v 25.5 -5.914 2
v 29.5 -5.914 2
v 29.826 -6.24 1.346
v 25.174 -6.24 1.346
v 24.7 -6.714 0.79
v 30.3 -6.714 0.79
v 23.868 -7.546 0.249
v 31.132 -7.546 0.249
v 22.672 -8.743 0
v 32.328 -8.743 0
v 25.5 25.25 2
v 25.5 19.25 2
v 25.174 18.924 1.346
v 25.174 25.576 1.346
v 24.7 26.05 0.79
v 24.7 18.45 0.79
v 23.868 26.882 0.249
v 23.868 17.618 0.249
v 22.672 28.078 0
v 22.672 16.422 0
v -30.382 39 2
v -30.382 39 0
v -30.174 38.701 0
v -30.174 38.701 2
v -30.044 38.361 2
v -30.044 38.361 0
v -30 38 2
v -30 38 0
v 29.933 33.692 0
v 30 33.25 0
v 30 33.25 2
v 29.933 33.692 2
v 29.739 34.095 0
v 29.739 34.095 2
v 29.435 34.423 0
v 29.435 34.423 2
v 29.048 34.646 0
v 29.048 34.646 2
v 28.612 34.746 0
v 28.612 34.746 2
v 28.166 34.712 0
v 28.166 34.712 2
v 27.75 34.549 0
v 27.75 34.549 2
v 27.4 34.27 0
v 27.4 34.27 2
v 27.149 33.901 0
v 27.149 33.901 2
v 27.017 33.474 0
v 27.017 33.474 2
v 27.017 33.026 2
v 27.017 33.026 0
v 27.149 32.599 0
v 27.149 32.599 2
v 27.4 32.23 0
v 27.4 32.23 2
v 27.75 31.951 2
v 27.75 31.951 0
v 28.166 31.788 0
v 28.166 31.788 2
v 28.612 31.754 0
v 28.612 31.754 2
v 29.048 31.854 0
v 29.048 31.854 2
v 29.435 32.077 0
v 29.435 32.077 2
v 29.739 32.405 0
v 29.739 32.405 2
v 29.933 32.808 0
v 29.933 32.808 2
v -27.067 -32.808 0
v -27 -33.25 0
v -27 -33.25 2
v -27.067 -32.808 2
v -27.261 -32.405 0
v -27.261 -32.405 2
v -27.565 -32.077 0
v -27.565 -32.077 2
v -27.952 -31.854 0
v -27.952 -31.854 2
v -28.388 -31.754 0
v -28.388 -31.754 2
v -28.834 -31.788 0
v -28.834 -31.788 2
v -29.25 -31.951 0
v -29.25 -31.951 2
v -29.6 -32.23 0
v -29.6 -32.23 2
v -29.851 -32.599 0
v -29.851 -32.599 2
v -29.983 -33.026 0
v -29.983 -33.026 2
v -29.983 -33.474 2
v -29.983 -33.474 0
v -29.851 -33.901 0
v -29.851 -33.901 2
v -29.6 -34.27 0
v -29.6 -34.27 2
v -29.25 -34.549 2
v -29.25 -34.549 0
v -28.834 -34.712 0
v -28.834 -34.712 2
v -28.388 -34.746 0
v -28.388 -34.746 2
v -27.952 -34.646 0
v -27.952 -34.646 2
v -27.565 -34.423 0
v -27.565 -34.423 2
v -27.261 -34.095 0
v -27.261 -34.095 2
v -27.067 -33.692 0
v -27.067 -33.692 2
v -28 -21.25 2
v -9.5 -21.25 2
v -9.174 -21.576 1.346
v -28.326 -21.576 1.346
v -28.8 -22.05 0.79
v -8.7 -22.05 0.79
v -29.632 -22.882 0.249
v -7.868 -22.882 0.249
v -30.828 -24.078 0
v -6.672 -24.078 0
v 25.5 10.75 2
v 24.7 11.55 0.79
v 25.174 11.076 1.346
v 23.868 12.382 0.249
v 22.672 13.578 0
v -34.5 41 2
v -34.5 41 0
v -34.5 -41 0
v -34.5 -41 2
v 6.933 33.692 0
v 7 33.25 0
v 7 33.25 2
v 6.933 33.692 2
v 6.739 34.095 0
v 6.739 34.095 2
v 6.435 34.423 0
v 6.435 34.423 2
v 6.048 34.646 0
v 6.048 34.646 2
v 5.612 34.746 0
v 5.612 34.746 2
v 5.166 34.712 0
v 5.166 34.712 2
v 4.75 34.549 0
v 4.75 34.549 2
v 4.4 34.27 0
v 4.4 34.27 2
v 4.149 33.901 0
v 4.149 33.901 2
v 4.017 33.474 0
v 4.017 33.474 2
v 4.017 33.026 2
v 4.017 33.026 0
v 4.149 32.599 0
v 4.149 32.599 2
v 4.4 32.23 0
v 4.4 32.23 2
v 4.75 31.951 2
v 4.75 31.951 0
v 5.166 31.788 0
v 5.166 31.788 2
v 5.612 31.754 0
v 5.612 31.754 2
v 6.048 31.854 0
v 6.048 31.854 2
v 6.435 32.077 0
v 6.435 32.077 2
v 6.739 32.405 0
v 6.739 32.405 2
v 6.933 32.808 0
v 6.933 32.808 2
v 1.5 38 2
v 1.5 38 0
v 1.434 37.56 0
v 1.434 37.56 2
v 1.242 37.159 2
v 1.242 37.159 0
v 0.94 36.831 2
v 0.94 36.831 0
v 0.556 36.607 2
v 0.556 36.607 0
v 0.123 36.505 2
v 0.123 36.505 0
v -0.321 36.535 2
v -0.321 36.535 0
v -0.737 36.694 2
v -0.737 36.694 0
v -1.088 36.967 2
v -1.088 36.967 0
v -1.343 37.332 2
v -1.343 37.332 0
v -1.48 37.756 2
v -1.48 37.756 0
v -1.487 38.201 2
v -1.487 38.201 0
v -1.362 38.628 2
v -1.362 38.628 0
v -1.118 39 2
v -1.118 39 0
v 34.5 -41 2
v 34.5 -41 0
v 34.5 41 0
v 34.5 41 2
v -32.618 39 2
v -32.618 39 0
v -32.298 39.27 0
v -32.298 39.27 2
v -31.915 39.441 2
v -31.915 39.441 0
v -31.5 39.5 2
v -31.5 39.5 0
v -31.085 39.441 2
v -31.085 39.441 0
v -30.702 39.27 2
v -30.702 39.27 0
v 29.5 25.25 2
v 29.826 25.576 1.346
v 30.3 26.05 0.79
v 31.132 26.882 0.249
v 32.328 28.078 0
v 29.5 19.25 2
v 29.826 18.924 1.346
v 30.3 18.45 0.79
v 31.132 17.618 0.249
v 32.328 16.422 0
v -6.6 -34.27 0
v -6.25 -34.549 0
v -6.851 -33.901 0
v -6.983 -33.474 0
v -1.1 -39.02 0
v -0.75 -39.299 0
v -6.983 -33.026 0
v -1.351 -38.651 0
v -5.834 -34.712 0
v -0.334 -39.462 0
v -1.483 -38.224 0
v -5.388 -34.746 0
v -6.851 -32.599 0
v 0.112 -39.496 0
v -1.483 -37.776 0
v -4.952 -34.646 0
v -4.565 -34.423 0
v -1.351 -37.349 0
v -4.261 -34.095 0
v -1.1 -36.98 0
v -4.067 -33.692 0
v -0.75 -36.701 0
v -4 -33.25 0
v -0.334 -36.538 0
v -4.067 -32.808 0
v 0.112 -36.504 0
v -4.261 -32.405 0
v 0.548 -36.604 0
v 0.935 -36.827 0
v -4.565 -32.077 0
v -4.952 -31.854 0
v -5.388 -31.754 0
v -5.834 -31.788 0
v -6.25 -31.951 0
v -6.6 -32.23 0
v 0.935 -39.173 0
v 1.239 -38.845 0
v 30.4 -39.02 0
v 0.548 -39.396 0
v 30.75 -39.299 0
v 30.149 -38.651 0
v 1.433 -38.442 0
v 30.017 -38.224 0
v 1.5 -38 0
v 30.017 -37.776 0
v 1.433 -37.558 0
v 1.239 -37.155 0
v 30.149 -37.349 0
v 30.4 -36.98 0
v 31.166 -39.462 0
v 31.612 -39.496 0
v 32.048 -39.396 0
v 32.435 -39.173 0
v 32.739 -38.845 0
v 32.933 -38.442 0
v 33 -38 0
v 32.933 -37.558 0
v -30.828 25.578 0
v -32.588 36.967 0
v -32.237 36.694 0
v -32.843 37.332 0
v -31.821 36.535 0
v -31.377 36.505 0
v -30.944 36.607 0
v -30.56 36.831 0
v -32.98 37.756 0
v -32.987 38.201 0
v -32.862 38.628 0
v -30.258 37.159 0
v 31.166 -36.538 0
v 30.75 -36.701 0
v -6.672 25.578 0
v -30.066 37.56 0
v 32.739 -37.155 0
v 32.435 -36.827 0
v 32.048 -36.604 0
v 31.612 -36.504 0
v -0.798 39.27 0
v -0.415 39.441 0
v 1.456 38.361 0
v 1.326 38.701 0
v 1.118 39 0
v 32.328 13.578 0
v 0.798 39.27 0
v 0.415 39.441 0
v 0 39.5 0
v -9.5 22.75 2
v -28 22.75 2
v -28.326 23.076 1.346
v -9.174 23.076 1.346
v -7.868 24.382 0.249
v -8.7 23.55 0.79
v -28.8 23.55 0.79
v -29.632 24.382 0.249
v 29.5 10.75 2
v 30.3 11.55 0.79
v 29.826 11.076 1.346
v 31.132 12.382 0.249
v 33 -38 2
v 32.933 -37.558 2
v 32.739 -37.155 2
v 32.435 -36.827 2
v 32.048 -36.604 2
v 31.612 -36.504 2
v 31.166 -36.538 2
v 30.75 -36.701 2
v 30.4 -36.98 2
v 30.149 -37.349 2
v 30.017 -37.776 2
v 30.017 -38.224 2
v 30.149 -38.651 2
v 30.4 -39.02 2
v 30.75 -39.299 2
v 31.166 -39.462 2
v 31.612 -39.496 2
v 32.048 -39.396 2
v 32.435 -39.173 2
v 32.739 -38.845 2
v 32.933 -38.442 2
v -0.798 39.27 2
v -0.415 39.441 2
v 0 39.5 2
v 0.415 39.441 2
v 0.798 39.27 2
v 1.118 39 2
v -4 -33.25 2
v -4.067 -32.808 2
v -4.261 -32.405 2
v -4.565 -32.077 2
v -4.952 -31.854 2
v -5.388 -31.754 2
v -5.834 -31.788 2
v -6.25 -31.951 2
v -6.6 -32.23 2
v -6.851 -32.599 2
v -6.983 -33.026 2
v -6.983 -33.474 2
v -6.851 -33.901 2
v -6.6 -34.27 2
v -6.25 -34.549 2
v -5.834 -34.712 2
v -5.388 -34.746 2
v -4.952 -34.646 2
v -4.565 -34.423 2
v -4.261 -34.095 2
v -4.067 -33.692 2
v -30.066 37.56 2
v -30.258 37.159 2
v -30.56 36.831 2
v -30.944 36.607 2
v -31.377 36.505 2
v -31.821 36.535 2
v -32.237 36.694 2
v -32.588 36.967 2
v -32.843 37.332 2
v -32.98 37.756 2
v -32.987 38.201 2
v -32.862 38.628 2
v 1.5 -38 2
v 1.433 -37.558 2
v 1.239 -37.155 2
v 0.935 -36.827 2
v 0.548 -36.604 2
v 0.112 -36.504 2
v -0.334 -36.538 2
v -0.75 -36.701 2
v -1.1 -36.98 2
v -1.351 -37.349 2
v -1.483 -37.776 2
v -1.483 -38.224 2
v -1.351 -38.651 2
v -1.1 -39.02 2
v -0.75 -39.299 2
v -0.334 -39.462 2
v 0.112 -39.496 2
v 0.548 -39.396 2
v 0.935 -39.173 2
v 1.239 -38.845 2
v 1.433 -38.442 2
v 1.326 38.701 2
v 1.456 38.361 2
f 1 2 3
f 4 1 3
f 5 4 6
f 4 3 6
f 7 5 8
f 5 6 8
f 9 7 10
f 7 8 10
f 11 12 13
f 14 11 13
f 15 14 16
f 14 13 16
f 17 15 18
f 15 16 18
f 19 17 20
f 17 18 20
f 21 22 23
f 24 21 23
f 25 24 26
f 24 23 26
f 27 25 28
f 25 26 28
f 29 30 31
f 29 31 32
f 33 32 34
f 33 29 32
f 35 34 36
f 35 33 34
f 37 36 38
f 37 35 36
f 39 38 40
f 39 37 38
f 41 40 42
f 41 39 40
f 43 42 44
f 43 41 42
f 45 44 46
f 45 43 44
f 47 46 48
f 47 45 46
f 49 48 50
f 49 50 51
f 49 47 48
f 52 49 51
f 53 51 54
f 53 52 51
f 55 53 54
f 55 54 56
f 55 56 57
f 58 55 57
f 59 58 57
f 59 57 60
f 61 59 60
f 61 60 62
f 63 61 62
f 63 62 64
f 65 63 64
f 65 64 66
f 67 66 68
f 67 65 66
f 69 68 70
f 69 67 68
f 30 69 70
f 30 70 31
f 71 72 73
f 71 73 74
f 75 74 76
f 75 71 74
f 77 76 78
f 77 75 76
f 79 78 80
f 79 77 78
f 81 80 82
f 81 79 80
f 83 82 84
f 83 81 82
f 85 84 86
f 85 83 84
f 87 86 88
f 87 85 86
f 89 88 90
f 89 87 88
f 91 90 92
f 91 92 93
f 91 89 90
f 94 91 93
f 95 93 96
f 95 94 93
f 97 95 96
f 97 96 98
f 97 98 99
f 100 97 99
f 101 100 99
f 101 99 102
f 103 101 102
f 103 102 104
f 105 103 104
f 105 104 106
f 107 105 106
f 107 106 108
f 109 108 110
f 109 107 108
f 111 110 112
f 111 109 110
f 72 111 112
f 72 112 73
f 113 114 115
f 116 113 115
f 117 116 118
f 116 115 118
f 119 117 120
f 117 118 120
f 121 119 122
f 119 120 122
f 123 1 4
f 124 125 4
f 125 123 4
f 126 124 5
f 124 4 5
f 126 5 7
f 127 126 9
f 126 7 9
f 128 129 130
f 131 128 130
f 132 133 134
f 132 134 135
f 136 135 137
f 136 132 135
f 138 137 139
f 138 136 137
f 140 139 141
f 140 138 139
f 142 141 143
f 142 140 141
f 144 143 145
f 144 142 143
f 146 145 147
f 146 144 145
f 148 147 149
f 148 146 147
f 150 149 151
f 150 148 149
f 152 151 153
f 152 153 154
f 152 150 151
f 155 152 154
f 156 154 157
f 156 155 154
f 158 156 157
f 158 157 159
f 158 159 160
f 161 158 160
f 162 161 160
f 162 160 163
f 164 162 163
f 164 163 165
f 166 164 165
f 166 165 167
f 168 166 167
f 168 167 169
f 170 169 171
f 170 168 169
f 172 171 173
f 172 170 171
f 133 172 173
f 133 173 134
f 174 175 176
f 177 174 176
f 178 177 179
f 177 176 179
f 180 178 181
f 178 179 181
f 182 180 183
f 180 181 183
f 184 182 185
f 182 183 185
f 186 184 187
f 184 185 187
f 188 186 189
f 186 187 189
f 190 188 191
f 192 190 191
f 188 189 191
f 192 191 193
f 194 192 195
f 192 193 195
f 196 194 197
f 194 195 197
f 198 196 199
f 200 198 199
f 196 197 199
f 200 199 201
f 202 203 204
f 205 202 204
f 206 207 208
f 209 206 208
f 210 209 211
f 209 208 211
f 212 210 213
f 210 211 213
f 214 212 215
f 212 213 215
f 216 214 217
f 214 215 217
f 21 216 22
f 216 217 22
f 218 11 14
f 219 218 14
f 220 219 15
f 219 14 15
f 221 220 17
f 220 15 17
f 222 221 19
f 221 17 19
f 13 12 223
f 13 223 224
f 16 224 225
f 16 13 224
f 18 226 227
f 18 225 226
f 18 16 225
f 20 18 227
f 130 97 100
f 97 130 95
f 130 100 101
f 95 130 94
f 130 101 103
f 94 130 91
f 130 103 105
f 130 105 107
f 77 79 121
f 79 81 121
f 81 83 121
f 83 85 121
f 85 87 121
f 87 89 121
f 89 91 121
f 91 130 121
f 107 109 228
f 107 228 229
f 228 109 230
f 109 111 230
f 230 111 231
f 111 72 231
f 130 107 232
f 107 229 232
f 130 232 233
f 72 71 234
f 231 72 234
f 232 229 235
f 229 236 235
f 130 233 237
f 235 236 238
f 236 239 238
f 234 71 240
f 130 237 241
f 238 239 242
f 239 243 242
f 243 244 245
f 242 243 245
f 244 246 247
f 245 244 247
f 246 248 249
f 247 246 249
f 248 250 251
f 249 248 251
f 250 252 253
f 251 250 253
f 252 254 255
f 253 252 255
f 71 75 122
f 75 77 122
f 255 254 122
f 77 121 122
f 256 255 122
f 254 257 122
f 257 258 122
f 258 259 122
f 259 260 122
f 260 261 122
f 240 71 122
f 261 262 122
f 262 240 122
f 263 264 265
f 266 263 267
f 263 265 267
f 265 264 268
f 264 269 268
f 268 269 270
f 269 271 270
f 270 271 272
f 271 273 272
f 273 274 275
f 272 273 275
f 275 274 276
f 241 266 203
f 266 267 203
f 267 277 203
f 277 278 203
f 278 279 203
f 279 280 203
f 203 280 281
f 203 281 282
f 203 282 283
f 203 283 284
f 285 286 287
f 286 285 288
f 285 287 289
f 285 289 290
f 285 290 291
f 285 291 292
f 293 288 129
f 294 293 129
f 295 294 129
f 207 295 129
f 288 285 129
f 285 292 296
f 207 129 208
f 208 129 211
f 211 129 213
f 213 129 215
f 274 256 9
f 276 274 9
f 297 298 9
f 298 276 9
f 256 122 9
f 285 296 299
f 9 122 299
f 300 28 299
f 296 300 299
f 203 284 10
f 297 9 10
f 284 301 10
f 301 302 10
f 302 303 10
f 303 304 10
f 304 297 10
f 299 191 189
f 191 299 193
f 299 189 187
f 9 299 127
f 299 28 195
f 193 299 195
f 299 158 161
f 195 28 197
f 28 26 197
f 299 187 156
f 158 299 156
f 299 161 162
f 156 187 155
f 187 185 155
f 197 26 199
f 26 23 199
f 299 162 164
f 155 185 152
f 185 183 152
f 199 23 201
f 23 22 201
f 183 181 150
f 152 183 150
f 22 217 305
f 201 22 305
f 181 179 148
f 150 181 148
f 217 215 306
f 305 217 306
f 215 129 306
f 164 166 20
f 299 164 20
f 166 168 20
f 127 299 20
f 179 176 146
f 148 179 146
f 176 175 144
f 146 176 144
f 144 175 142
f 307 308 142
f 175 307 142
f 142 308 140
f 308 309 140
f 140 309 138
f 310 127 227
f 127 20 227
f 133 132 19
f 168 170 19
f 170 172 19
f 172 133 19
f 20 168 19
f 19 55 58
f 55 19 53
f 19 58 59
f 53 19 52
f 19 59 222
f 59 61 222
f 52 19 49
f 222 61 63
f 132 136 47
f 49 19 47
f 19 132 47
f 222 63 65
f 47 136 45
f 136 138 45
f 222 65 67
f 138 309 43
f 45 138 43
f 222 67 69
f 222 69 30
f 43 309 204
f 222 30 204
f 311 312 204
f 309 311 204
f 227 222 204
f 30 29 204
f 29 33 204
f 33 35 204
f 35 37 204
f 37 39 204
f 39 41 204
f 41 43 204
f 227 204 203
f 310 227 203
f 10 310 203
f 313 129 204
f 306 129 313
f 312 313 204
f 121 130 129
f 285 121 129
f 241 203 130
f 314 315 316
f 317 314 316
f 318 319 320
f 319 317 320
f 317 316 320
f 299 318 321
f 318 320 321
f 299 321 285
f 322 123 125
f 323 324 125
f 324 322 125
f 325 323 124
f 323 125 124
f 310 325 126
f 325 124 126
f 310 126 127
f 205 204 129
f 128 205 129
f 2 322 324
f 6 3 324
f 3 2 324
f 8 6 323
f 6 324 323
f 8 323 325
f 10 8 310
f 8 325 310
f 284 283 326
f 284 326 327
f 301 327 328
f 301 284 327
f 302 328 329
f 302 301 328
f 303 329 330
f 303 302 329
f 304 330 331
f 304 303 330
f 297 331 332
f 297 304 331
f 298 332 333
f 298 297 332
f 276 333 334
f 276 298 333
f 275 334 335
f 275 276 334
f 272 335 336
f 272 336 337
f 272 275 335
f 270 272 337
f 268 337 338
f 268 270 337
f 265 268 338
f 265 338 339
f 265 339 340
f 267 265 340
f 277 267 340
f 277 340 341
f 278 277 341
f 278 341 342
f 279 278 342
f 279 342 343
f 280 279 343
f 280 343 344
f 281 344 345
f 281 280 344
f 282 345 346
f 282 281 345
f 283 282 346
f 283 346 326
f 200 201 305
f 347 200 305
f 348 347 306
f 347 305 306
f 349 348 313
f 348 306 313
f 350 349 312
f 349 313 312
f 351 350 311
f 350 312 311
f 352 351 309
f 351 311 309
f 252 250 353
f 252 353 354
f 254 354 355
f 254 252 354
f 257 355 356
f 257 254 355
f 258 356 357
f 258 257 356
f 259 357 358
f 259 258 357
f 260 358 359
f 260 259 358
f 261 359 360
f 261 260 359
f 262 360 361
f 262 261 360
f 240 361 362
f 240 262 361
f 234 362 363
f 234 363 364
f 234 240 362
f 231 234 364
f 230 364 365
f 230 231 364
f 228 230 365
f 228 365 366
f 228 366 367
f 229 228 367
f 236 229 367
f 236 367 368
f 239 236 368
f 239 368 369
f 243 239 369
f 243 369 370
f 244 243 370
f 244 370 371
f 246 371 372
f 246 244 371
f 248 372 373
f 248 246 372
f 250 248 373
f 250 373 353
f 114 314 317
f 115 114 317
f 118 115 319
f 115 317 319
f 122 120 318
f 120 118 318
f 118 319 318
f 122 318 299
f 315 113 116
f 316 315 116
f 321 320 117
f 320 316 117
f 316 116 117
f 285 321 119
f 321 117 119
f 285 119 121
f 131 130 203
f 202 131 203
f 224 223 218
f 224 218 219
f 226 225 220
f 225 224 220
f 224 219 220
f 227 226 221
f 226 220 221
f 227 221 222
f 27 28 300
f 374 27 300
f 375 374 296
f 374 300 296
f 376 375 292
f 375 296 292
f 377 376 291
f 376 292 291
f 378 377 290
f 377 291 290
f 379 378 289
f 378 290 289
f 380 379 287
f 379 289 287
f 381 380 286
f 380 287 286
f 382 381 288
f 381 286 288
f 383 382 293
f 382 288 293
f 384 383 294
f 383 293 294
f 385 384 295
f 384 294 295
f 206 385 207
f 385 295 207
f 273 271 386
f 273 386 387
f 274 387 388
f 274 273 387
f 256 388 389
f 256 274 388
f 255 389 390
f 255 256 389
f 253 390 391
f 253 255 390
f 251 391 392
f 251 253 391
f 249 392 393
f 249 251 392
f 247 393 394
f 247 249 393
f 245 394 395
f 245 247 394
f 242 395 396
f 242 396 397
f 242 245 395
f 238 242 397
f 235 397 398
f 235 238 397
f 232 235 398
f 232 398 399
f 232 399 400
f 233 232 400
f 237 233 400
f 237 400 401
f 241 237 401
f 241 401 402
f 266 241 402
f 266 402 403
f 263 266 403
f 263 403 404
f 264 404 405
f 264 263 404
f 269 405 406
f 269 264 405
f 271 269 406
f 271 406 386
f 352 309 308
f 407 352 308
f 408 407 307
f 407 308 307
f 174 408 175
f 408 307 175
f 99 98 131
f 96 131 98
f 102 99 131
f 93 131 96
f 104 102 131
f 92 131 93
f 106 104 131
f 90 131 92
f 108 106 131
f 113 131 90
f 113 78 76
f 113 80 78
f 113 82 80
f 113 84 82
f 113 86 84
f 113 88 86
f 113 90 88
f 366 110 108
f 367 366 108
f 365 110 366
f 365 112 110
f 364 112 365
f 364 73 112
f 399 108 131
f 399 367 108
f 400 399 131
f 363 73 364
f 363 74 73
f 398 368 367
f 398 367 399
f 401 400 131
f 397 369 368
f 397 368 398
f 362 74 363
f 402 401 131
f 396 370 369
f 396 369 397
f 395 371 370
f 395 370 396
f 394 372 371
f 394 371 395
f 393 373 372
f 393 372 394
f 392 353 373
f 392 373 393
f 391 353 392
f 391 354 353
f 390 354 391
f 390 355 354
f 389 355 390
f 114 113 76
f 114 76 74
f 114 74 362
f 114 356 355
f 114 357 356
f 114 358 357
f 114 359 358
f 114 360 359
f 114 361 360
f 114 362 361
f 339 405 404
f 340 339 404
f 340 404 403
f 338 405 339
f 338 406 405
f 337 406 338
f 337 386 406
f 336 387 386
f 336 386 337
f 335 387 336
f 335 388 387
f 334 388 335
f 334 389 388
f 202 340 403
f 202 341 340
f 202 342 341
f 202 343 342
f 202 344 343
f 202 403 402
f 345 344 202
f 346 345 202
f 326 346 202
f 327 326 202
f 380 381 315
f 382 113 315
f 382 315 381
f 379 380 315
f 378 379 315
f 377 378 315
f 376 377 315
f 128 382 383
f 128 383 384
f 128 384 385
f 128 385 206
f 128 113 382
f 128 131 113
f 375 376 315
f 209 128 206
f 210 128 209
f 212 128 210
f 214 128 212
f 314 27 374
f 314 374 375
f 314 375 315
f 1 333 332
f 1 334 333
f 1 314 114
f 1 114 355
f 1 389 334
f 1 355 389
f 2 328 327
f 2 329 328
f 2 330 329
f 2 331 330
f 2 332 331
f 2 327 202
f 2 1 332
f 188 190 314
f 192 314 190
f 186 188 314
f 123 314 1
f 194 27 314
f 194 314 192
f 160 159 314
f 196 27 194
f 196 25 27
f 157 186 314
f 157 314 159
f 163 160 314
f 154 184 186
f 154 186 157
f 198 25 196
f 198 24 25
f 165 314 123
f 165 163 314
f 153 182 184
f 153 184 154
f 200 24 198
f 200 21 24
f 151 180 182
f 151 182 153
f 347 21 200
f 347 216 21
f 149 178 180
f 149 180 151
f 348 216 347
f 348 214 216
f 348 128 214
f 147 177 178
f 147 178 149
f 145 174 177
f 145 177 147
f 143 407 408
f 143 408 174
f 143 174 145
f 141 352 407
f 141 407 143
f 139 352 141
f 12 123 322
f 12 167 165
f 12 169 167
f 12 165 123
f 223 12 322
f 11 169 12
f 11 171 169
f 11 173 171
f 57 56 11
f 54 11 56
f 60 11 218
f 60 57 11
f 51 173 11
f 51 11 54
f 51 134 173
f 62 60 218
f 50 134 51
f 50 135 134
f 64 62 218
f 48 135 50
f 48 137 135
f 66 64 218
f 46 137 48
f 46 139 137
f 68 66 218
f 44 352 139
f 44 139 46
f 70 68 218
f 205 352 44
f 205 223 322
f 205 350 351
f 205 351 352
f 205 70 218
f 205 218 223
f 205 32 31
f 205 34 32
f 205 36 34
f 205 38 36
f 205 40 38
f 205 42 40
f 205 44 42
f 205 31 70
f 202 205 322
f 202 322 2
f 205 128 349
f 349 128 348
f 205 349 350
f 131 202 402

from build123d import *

# Parameters (mm, degrees)
F0_R          = 1.5
F0_W          = 18.5
F0_H          = 44
F0_W_2        = 4
F0_H_2        = 16.6644380502
F0_H_3        = 6
F0_W_3        = 4.7
F0_H_4        = 2
F0_W_4        = 13
F0_W_5        = 2.3
F0_W_6        = 1.5
F0_W_7        = 9
F0_W_8        = 11
F1_DEPTH      = 2
F2_T1_DEPTH   = 16.6644380502
F2_T3_DEPTH   = 4
F2_T5_DEPTH   = 6
F2_T7_DEPTH   = 44
F2_T9_DEPTH   = 18.5
F2_T15_DEPTH  = 11.0710678119
F2_T19_DEPTH  = 23.7355058621
F2_T26_DEPTH  = 11.0710678119
F2_T30_DEPTH  = 23.7355058621
F2_T37_DEPTH  = 23.7355058621
F2_T41_DEPTH  = 11.0710678119
F2_T49_DEPTH  = 11.0710678119
F2_T54_DEPTH  = 23.7355058621
F2_T61_DEPTH  = 13.0710678119
F2_T65_DEPTH  = 11.0710678119
F2_T73_DEPTH  = 13.0710678119
F2_T77_DEPTH  = 11.0710678119
F2_T84_DEPTH  = 11.0710678119
F2_T89_DEPTH  = 13.0710678119
F2_S91_R      = 1.5
F2_T92_DEPTH  = 8
F2_T98_DEPTH  = 13.0710678119
F2_T102_DEPTH = 11.0710678119
F2_T109_DEPTH = 25.5710678119
F2_T113_DEPTH = 51.0710678119
F2_T120_DEPTH = 51.0710678119
F2_T124_DEPTH = 25.5710678119
F2_T131_DEPTH = 51.0710678119
F2_T135_DEPTH = 25.5710678119
F2_T143_DEPTH = 51.0710678119
F2_T147_DEPTH = 25.5710678119


# Not quite as in the source:
# - a fillet or chamfer that OpenCascade refuses, or shapes differently, is made with other operations: its cross-section is extruded or revolved along the edge and cut away or added


with BuildPart() as f1:
    # F0 (on Top) → F1 (new body)
    with BuildSketch(Plane.XY):
        with BuildLine():
            Line((12.5, -41), (34.5, -41))
            Line((34.5, -41), (34.5, 39))
            Line((34.5, 39), (28.5, 39))
            Line((28.5, 39), (25.5, 39))
            Line((25.5, 39), (20.8, 39))
            Line((20.8, 39), (7.8, 39))
            Line((7.8, 39), (5.5, 39))
            Line((5.5, 39), (1.1180339887, 39))
            ThreePointArc((1.1180339887, 39), (1.4012585384, 38.5352331347), (1.5, 38))
            ThreePointArc((1.5, 38), (-0.5352331347, 36.5987414616), (-1.1180339887, 39))
            Line((-1.1180339887, 39), (-5.5, 39))
            Line((-5.5, 39), (-14.5, 39))
            Line((-14.5, 39), (-25.5, 39))
            Line((-25.5, 39), (-27, 39))
            Line((-27, 39), (-28.5, 39))
            Line((-28.5, 39), (-30.3819660113, 39))
            ThreePointArc((-30.3819660113, 39), (-30.0987414616, 38.5352331347), (-30, 38))
            ThreePointArc((-30, 38), (-32.0352331347, 36.5987414616), (-32.6180339887, 39))
            Line((-32.6180339887, 39), (-34.5, 39))
            Line((-34.5, 39), (-34.5, -41))
            Line((-34.5, -41), (-12.5, -41))
            Line((-12.5, -41), (-10.5, -41))
            Line((-10.5, -41), (10.5, -41))
            Line((10.5, -41), (12.5, -41))
        make_face()
        with Locations((-28.5, -33.25)):
            Circle(F0_R, mode=Mode.SUBTRACT)
        with Locations((-5.5, -33.25)):
            Circle(F0_R, mode=Mode.SUBTRACT)
        with Locations((0, -38)):
            Circle(F0_R, mode=Mode.SUBTRACT)
        with Locations((31.5, -38)):
            Circle(F0_R, mode=Mode.SUBTRACT)
        with Locations((-18.75, 0.75)):
            Rectangle(F0_W, F0_H, mode=Mode.SUBTRACT)
        with Locations((-28.5, 33.25)):
            Circle(F0_R, mode=Mode.SUBTRACT)
        with Locations((-5.5, 33.25)):
            Circle(F0_R, mode=Mode.SUBTRACT)
        with Locations((27.5, 2.4177809749)):
            Rectangle(F0_W_2, F0_H_2, mode=Mode.SUBTRACT)
        with Locations((5.5, 33.25)):
            Circle(F0_R, mode=Mode.SUBTRACT)
        with Locations((27.5, 22.25)):
            Rectangle(F0_W_2, F0_H_3, mode=Mode.SUBTRACT)
        with Locations((28.5, 33.25)):
            Circle(F0_R, mode=Mode.SUBTRACT)
        Polygon((28.5, 39), (34.5, 39), (34.5, 41), (28, 41), (25.5, 41), (25.5, 39), align=None)
        with Locations((23.15, 40)):
            Rectangle(F0_W_3, F0_H_4)
        with Locations((14.3, 40)):
            Rectangle(F0_W_4, F0_H_4)
        with Locations((6.65, 40)):
            Rectangle(F0_W_5, F0_H_4)
        with BuildLine():
            Line((-34.5, 41), (-34.5, 39))
            Line((-34.5, 39), (-32.6180339887, 39))
            ThreePointArc((-32.6180339887, 39), (-31.5, 39.5), (-30.3819660113, 39))
            Line((-30.3819660113, 39), (-28.5, 39))
            Line((-28.5, 39), (-27, 39))
            Line((-27, 39), (-27, 41))
            Line((-27, 41), (-34.5, 41))
        make_face()
        with BuildLine():
            Line((1.1180339887, 39), (5.5, 39))
            Line((5.5, 39), (5.5, 41))
            Line((5.5, 41), (-5.5, 41))
            Line((-5.5, 41), (-5.5, 39))
            Line((-5.5, 39), (-1.1180339887, 39))
            ThreePointArc((-1.1180339887, 39), (0, 39.5), (1.1180339887, 39))
        make_face()
        with Locations((-26.25, 40)):
            Rectangle(F0_W_6, F0_H_4)
        with Locations((-10, 40)):
            Rectangle(F0_W_7, F0_H_4)
        with Locations((-20, 40)):
            Rectangle(F0_W_8, F0_H_4)
        with Locations((-28.5, 33.25)):
            Circle(F0_R)
        with Locations((-5.5, 33.25)):
            Circle(F0_R)
    extrude(amount=F1_DEPTH)

    # F2: fillet of radius 3 on 12 edges, made by hand

    # F2_s2 → F2_t1 (cut)
    with BuildSketch(Plane.XZ.offset(-10.75)):
        with BuildLine():
            ThreePointArc((25.5, 2), (24.4036236828, 0.5505102572), (22.6715728753, 0))
            Line((22.6715728753, 0), (25.5, 0))
            Line((25.5, 0), (25.5, 2))
        make_face()
        with BuildLine():
            ThreePointArc((29.5, 2), (30.5963763172, 0.5505102572), (32.3284271247, 0))
            Line((32.3284271247, 0), (29.5, 0))
            Line((29.5, 0), (29.5, 2))
        make_face()
    extrude(amount=F2_T1_DEPTH, mode=Mode.SUBTRACT)

    # F2_s4 → F2_t3 (cut)
    with BuildSketch(Plane.YZ.offset(25.5)):
        with BuildLine():
            ThreePointArc((-5.9144380502, 2), (-7.0108143674, 0.5505102572), (-8.742865175, 0))
            Line((-8.742865175, 0), (-5.9144380502, 0))
            Line((-5.9144380502, 0), (-5.9144380502, 2))
        make_face()
        with BuildLine():
            ThreePointArc((10.75, 2), (11.8463763172, 0.5505102572), (13.5784271247, 0))
            Line((13.5784271247, 0), (10.75, 0))
            Line((10.75, 0), (10.75, 2))
        make_face()
        with BuildLine():
            ThreePointArc((19.25, 2), (18.1536236828, 0.5505102572), (16.4215728753, 0))
            Line((16.4215728753, 0), (19.25, 0))
            Line((19.25, 0), (19.25, 2))
        make_face()
        with BuildLine():
            ThreePointArc((25.25, 2), (26.3463763172, 0.5505102572), (28.0784271247, 0))
            Line((28.0784271247, 0), (25.25, 0))
            Line((25.25, 0), (25.25, 2))
        make_face()
    extrude(amount=F2_T3_DEPTH, mode=Mode.SUBTRACT)

    # F2_s6 → F2_t5 (cut)
    with BuildSketch(Plane.XZ.offset(-25.25)):
        with BuildLine():
            ThreePointArc((29.5, 2), (30.5963763172, 0.5505102572), (32.3284271247, 0))
            Line((32.3284271247, 0), (29.5, 0))
            Line((29.5, 0), (29.5, 2))
        make_face()
        with BuildLine():
            ThreePointArc((25.5, 2), (24.4036236828, 0.5505102572), (22.6715728753, 0))
            Line((22.6715728753, 0), (25.5, 0))
            Line((25.5, 0), (25.5, 2))
        make_face()
    extrude(amount=F2_T5_DEPTH, mode=Mode.SUBTRACT)

    # F2_s8 → F2_t7 (cut)
    with BuildSketch(Plane.XZ.offset(-22.75)):
        with BuildLine():
            ThreePointArc((-9.5, 2), (-8.4036236828, 0.5505102572), (-6.6715728753, 0))
            Line((-6.6715728753, 0), (-9.5, 0))
            Line((-9.5, 0), (-9.5, 2))
        make_face()
        with BuildLine():
            ThreePointArc((-28, 2), (-29.0963763172, 0.5505102572), (-30.8284271247, 0))
            Line((-30.8284271247, 0), (-28, 0))
            Line((-28, 0), (-28, 2))
        make_face()
    extrude(amount=F2_T7_DEPTH, mode=Mode.SUBTRACT)

    # F2_s10 → F2_t9 (cut)
    with BuildSketch(Plane.YZ.offset(-28)):
        with BuildLine():
            ThreePointArc((-21.25, 2), (-22.3463763172, 0.5505102572), (-24.0784271247, 0))
            Line((-24.0784271247, 0), (-21.25, 0))
            Line((-21.25, 0), (-21.25, 2))
        make_face()
        with BuildLine():
            ThreePointArc((22.75, 2), (23.8463763172, 0.5505102572), (25.5784271247, 0))
            Line((25.5784271247, 0), (22.75, 0))
            Line((22.75, 0), (22.75, 2))
        make_face()
    extrude(amount=F2_T9_DEPTH, mode=Mode.SUBTRACT)


with BuildPart() as f2_tool13:
    # F2_s14 → F2_t15 (new body)
    with BuildSketch(Plane.YZ.offset(29.5)):
        with BuildLine():
            ThreePointArc((-5.9144380502, 2), (-7.0108143674, 0.5505102572), (-8.742865175, 0))
            Line((-8.742865175, 0), (-5.9144380502, 0))
            Line((-5.9144380502, 0), (-5.9144380502, 2))
        make_face()
    extrude(amount=-F2_T15_DEPTH)

    split(bisect_by=Plane.YZ.offset(25.5), keep=Keep.BOTTOM)


with BuildPart() as f2_tool17:
    # F2_s18 → F2_t19 (new body)
    with BuildSketch(Plane.XZ.offset(12.9855058621)):
        with BuildLine():
            ThreePointArc((25.5, 2), (24.4036236828, 0.5505102572), (22.6715728753, 0))
            Line((22.6715728753, 0), (25.5, 0))
            Line((25.5, 0), (25.5, 2))
        make_face()
    extrude(amount=-F2_T19_DEPTH)

    split(bisect_by=Plane.XZ.offset(5.9144380502), keep=Keep.TOP)


with BuildPart() as f2_tool13_1:
    add(f2_tool13.part)

    # F2_t21: intersect F2_tool17
    add(f2_tool17.part, mode=Mode.INTERSECT)


with BuildPart() as f1_1:
    add(f1.part)

    # F2_t11: cut F2_tool13
    add(f2_tool13_1.part, mode=Mode.SUBTRACT)


with BuildPart() as f2_tool24:
    # F2_s25 → F2_t26 (new body)
    with BuildSketch(Plane.YZ.offset(18.4289321881)):
        with BuildLine():
            ThreePointArc((10.75, 2), (11.8463763172, 0.5505102572), (13.5784271247, 0))
            Line((13.5784271247, 0), (10.75, 0))
            Line((10.75, 0), (10.75, 2))
        make_face()
    extrude(amount=F2_T26_DEPTH)

    split(bisect_by=Plane.YZ.offset(25.5), keep=Keep.BOTTOM)


with BuildPart() as f2_tool28:
    # F2_s29 → F2_t30 (new body)
    with BuildSketch(Plane.XZ.offset(5.9144380502)):
        with BuildLine():
            ThreePointArc((25.5, 2), (24.4036236828, 0.5505102572), (22.6715728753, 0))
            Line((22.6715728753, 0), (25.5, 0))
            Line((25.5, 0), (25.5, 2))
        make_face()
    extrude(amount=-F2_T30_DEPTH)

    split(bisect_by=Plane.XZ.offset(-10.75), keep=Keep.BOTTOM)


with BuildPart() as f2_tool24_1:
    add(f2_tool24.part)

    # F2_t32: intersect F2_tool28
    add(f2_tool28.part, mode=Mode.INTERSECT)


with BuildPart() as f1_2:
    add(f1_1.part)

    # F2_t22: cut F2_tool24
    add(f2_tool24_1.part, mode=Mode.SUBTRACT)


with BuildPart() as f2_tool35:
    # F2_s36 → F2_t37 (new body)
    with BuildSketch(Plane.XZ.offset(-10.75)):
        with BuildLine():
            ThreePointArc((29.5, 2), (30.5963763172, 0.5505102572), (32.3284271247, 0))
            Line((32.3284271247, 0), (29.5, 0))
            Line((29.5, 0), (29.5, 2))
        make_face()
    extrude(amount=F2_T37_DEPTH)

    split(bisect_by=Plane.XZ.offset(5.9144380502), keep=Keep.TOP)


with BuildPart() as f2_tool39:
    # F2_s40 → F2_t41 (new body)
    with BuildSketch(Plane.YZ.offset(36.5710678119)):
        with BuildLine():
            ThreePointArc((-5.9144380502, 2), (-7.0108143674, 0.5505102572), (-8.742865175, 0))
            Line((-8.742865175, 0), (-5.9144380502, 0))
            Line((-5.9144380502, 0), (-5.9144380502, 2))
        make_face()
    extrude(amount=-F2_T41_DEPTH)

    split(bisect_by=Plane.YZ.offset(34.5), keep=Keep.BOTTOM)

    split(bisect_by=Plane.YZ.offset(29.5), keep=Keep.TOP)


with BuildPart() as f2_tool35_1:
    add(f2_tool35.part)

    # F2_t44: intersect F2_tool39
    add(f2_tool39.part, mode=Mode.INTERSECT)


with BuildPart() as f1_3:
    add(f1_2.part)

    # F2_t33: cut F2_tool35
    add(f2_tool35_1.part, mode=Mode.SUBTRACT)


with BuildPart() as f2_tool47:
    # F2_s48 → F2_t49 (new body)
    with BuildSketch(Plane.YZ.offset(25.5)):
        with BuildLine():
            ThreePointArc((10.75, 2), (11.8463763172, 0.5505102572), (13.5784271247, 0))
            Line((13.5784271247, 0), (10.75, 0))
            Line((10.75, 0), (10.75, 2))
        make_face()
    extrude(amount=F2_T49_DEPTH)

    split(bisect_by=Plane.YZ.offset(34.5), keep=Keep.BOTTOM)

    split(bisect_by=Plane.YZ.offset(29.5), keep=Keep.TOP)


with BuildPart() as f2_tool52:
    # F2_s53 → F2_t54 (new body)
    with BuildSketch(Plane.XZ.offset(-17.8210678119)):
        with BuildLine():
            ThreePointArc((29.5, 2), (30.5963763172, 0.5505102572), (32.3284271247, 0))
            Line((32.3284271247, 0), (29.5, 0))
            Line((29.5, 0), (29.5, 2))
        make_face()
    extrude(amount=F2_T54_DEPTH)

    split(bisect_by=Plane.XZ.offset(-10.75), keep=Keep.BOTTOM)


with BuildPart() as f2_tool47_1:
    add(f2_tool47.part)

    # F2_t56: intersect F2_tool52
    add(f2_tool52.part, mode=Mode.INTERSECT)


with BuildPart() as f1_4:
    add(f1_3.part)

    # F2_t45: cut F2_tool47
    add(f2_tool47_1.part, mode=Mode.SUBTRACT)


with BuildPart() as f2_tool59:
    # F2_s60 → F2_t61 (new body)
    with BuildSketch(Plane.XZ.offset(-25.25)):
        with BuildLine():
            ThreePointArc((29.5, 2), (30.5963763172, 0.5505102572), (32.3284271247, 0))
            Line((32.3284271247, 0), (29.5, 0))
            Line((29.5, 0), (29.5, 2))
        make_face()
    extrude(amount=F2_T61_DEPTH)

    split(bisect_by=Plane.XZ.offset(-19.25), keep=Keep.TOP)


with BuildPart() as f2_tool63:
    # F2_s64 → F2_t65 (new body)
    with BuildSketch(Plane.YZ.offset(36.5710678119)):
        with BuildLine():
            ThreePointArc((19.25, 2), (18.1536236828, 0.5505102572), (16.4215728753, 0))
            Line((16.4215728753, 0), (19.25, 0))
            Line((19.25, 0), (19.25, 2))
        make_face()
    extrude(amount=-F2_T65_DEPTH)

    split(bisect_by=Plane.YZ.offset(34.5), keep=Keep.BOTTOM)

    split(bisect_by=Plane.YZ.offset(29.5), keep=Keep.TOP)


with BuildPart() as f2_tool59_1:
    add(f2_tool59.part)

    # F2_t68: intersect F2_tool63
    add(f2_tool63.part, mode=Mode.INTERSECT)


with BuildPart() as f1_5:
    add(f1_4.part)

    # F2_t57: cut F2_tool59
    add(f2_tool59_1.part, mode=Mode.SUBTRACT)


with BuildPart() as f2_tool71:
    # F2_s72 → F2_t73 (new body)
    with BuildSketch(Plane.XZ.offset(-12.1789321881)):
        with BuildLine():
            ThreePointArc((25.5, 2), (24.4036236828, 0.5505102572), (22.6715728753, 0))
            Line((22.6715728753, 0), (25.5, 0))
            Line((25.5, 0), (25.5, 2))
        make_face()
    extrude(amount=-F2_T73_DEPTH)

    split(bisect_by=Plane.XZ.offset(-19.25), keep=Keep.TOP)


with BuildPart() as f2_tool75:
    # F2_s76 → F2_t77 (new body)
    with BuildSketch(Plane.YZ.offset(29.5)):
        with BuildLine():
            ThreePointArc((19.25, 2), (18.1536236828, 0.5505102572), (16.4215728753, 0))
            Line((16.4215728753, 0), (19.25, 0))
            Line((19.25, 0), (19.25, 2))
        make_face()
    extrude(amount=-F2_T77_DEPTH)

    split(bisect_by=Plane.YZ.offset(25.5), keep=Keep.BOTTOM)


with BuildPart() as f2_tool71_1:
    add(f2_tool71.part)

    # F2_t79: intersect F2_tool75
    add(f2_tool75.part, mode=Mode.INTERSECT)


with BuildPart() as f1_6:
    add(f1_5.part)

    # F2_t69: cut F2_tool71
    add(f2_tool71_1.part, mode=Mode.SUBTRACT)


with BuildPart() as f2_tool82:
    # F2_s83 → F2_t84 (new body)
    with BuildSketch(Plane.YZ.offset(25.5)):
        with BuildLine():
            ThreePointArc((25.25, 2), (26.3463763172, 0.5505102572), (28.0784271247, 0))
            Line((28.0784271247, 0), (25.25, 0))
            Line((25.25, 0), (25.25, 2))
        make_face()
    extrude(amount=F2_T84_DEPTH)

    split(bisect_by=Plane.YZ.offset(34.5), keep=Keep.BOTTOM)

    split(bisect_by=Plane.YZ.offset(29.5), keep=Keep.TOP)


with BuildPart() as f2_tool87:
    # F2_s88 → F2_t89 (new body)
    with BuildSketch(Plane.XZ.offset(-32.3210678119)):
        with BuildLine():
            ThreePointArc((29.5, 2), (30.5963763172, 0.5505102572), (32.3284271247, 0))
            Line((32.3284271247, 0), (29.5, 0))
            Line((29.5, 0), (29.5, 2))
        make_face()
    extrude(amount=F2_T89_DEPTH)

    split(bisect_by=Plane.XZ.offset(-25.25), keep=Keep.BOTTOM)

    # F2_s91 → F2_t92 (cut, symmetric)
    with BuildSketch(Plane.XY.offset(1)):
        with Locations((28.5, 33.25)):
            Circle(F2_S91_R)
    extrude(amount=F2_T92_DEPTH, both=True, mode=Mode.SUBTRACT)


with BuildPart() as f2_tool82_1:
    add(f2_tool82.part)

    # F2_t93: intersect F2_tool87
    add(f2_tool87.part, mode=Mode.INTERSECT)


with BuildPart() as f1_7:
    add(f1_6.part)

    # F2_t80: cut F2_tool82
    add(f2_tool82_1.part, mode=Mode.SUBTRACT)


with BuildPart() as f2_tool96:
    # F2_s97 → F2_t98 (new body)
    with BuildSketch(Plane.XZ.offset(-19.25)):
        with BuildLine():
            ThreePointArc((25.5, 2), (24.4036236828, 0.5505102572), (22.6715728753, 0))
            Line((22.6715728753, 0), (25.5, 0))
            Line((25.5, 0), (25.5, 2))
        make_face()
    extrude(amount=-F2_T98_DEPTH)

    split(bisect_by=Plane.XZ.offset(-25.25), keep=Keep.BOTTOM)


with BuildPart() as f2_tool100:
    # F2_s101 → F2_t102 (new body)
    with BuildSketch(Plane.YZ.offset(18.4289321881)):
        with BuildLine():
            ThreePointArc((25.25, 2), (26.3463763172, 0.5505102572), (28.0784271247, 0))
            Line((28.0784271247, 0), (25.25, 0))
            Line((25.25, 0), (25.25, 2))
        make_face()
    extrude(amount=F2_T102_DEPTH)

    split(bisect_by=Plane.YZ.offset(25.5), keep=Keep.BOTTOM)


with BuildPart() as f2_tool96_1:
    add(f2_tool96.part)

    # F2_t104: intersect F2_tool100
    add(f2_tool100.part, mode=Mode.INTERSECT)


with BuildPart() as f1_8:
    add(f1_7.part)

    # F2_t94: cut F2_tool96
    add(f2_tool96_1.part, mode=Mode.SUBTRACT)


with BuildPart() as f2_tool107:
    # F2_s108 → F2_t109 (new body)
    with BuildSketch(Plane.YZ.offset(-28)):
        with BuildLine():
            ThreePointArc((22.75, 2), (23.8463763172, 0.5505102572), (25.5784271247, 0))
            Line((25.5784271247, 0), (22.75, 0))
            Line((22.75, 0), (22.75, 2))
        make_face()
    extrude(amount=F2_T109_DEPTH)

    split(bisect_by=Plane.YZ.offset(-9.5), keep=Keep.TOP)


with BuildPart() as f2_tool111:
    # F2_s112 → F2_t113 (new body)
    with BuildSketch(Plane.XZ.offset(-29.8210678119)):
        with BuildLine():
            ThreePointArc((-9.5, 2), (-8.4036236828, 0.5505102572), (-6.6715728753, 0))
            Line((-6.6715728753, 0), (-9.5, 0))
            Line((-9.5, 0), (-9.5, 2))
        make_face()
    extrude(amount=F2_T113_DEPTH)

    split(bisect_by=Plane.XZ.offset(-22.75), keep=Keep.BOTTOM)


with BuildPart() as f2_tool107_1:
    add(f2_tool107.part)

    # F2_t115: intersect F2_tool111
    add(f2_tool111.part, mode=Mode.INTERSECT)


with BuildPart() as f1_9:
    add(f1_8.part)

    # F2_t105: cut F2_tool107
    add(f2_tool107_1.part, mode=Mode.SUBTRACT)


with BuildPart() as f2_tool118:
    # F2_s119 → F2_t120 (new body)
    with BuildSketch(Plane.XZ.offset(-22.75)):
        with BuildLine():
            ThreePointArc((-9.5, 2), (-8.4036236828, 0.5505102572), (-6.6715728753, 0))
            Line((-6.6715728753, 0), (-9.5, 0))
            Line((-9.5, 0), (-9.5, 2))
        make_face()
    extrude(amount=F2_T120_DEPTH)

    split(bisect_by=Plane.XZ.offset(21.25), keep=Keep.TOP)


with BuildPart() as f2_tool122:
    # F2_s123 → F2_t124 (new body)
    with BuildSketch(Plane.YZ.offset(-2.4289321881)):
        with BuildLine():
            ThreePointArc((-21.25, 2), (-22.3463763172, 0.5505102572), (-24.0784271247, 0))
            Line((-24.0784271247, 0), (-21.25, 0))
            Line((-21.25, 0), (-21.25, 2))
        make_face()
    extrude(amount=-F2_T124_DEPTH)

    split(bisect_by=Plane.YZ.offset(-9.5), keep=Keep.TOP)


with BuildPart() as f2_tool118_1:
    add(f2_tool118.part)

    # F2_t126: intersect F2_tool122
    add(f2_tool122.part, mode=Mode.INTERSECT)


with BuildPart() as f1_10:
    add(f1_9.part)

    # F2_t116: cut F2_tool118
    add(f2_tool118_1.part, mode=Mode.SUBTRACT)


with BuildPart() as f2_tool129:
    # F2_s130 → F2_t131 (new body)
    with BuildSketch(Plane.XZ.offset(28.3210678119)):
        with BuildLine():
            ThreePointArc((-28, 2), (-29.0963763172, 0.5505102572), (-30.8284271247, 0))
            Line((-30.8284271247, 0), (-28, 0))
            Line((-28, 0), (-28, 2))
        make_face()
    extrude(amount=-F2_T131_DEPTH)

    split(bisect_by=Plane.XZ.offset(21.25), keep=Keep.TOP)


with BuildPart() as f2_tool133:
    # F2_s134 → F2_t135 (new body)
    with BuildSketch(Plane.YZ.offset(-9.5)):
        with BuildLine():
            ThreePointArc((-21.25, 2), (-22.3463763172, 0.5505102572), (-24.0784271247, 0))
            Line((-24.0784271247, 0), (-21.25, 0))
            Line((-21.25, 0), (-21.25, 2))
        make_face()
    extrude(amount=-F2_T135_DEPTH)

    split(bisect_by=Plane.YZ.offset(-34.5), keep=Keep.TOP)

    split(bisect_by=Plane.YZ.offset(-28), keep=Keep.BOTTOM)


with BuildPart() as f2_tool129_1:
    add(f2_tool129.part)

    # F2_t138: intersect F2_tool133
    add(f2_tool133.part, mode=Mode.INTERSECT)


with BuildPart() as f1_11:
    add(f1_10.part)

    # F2_t127: cut F2_tool129
    add(f2_tool129_1.part, mode=Mode.SUBTRACT)


with BuildPart() as f2_tool141:
    # F2_s142 → F2_t143 (new body)
    with BuildSketch(Plane.XZ.offset(21.25)):
        with BuildLine():
            ThreePointArc((-28, 2), (-29.0963763172, 0.5505102572), (-30.8284271247, 0))
            Line((-30.8284271247, 0), (-28, 0))
            Line((-28, 0), (-28, 2))
        make_face()
    extrude(amount=-F2_T143_DEPTH)

    split(bisect_by=Plane.XZ.offset(-22.75), keep=Keep.BOTTOM)


with BuildPart() as f2_tool145:
    # F2_s146 → F2_t147 (new body)
    with BuildSketch(Plane.YZ.offset(-35.0710678119)):
        with BuildLine():
            ThreePointArc((22.75, 2), (23.8463763172, 0.5505102572), (25.5784271247, 0))
            Line((25.5784271247, 0), (22.75, 0))
            Line((22.75, 0), (22.75, 2))
        make_face()
    extrude(amount=F2_T147_DEPTH)

    split(bisect_by=Plane.YZ.offset(-34.5), keep=Keep.TOP)

    split(bisect_by=Plane.YZ.offset(-28), keep=Keep.BOTTOM)


with BuildPart() as f2_tool141_1:
    add(f2_tool141.part)

    # F2_t150: intersect F2_tool145
    add(f2_tool145.part, mode=Mode.INTERSECT)


with BuildPart() as f1_12:
    add(f1_11.part)

    # F2_t139: cut F2_tool141
    add(f2_tool141_1.part, mode=Mode.SUBTRACT)


solid = f1_12.part
